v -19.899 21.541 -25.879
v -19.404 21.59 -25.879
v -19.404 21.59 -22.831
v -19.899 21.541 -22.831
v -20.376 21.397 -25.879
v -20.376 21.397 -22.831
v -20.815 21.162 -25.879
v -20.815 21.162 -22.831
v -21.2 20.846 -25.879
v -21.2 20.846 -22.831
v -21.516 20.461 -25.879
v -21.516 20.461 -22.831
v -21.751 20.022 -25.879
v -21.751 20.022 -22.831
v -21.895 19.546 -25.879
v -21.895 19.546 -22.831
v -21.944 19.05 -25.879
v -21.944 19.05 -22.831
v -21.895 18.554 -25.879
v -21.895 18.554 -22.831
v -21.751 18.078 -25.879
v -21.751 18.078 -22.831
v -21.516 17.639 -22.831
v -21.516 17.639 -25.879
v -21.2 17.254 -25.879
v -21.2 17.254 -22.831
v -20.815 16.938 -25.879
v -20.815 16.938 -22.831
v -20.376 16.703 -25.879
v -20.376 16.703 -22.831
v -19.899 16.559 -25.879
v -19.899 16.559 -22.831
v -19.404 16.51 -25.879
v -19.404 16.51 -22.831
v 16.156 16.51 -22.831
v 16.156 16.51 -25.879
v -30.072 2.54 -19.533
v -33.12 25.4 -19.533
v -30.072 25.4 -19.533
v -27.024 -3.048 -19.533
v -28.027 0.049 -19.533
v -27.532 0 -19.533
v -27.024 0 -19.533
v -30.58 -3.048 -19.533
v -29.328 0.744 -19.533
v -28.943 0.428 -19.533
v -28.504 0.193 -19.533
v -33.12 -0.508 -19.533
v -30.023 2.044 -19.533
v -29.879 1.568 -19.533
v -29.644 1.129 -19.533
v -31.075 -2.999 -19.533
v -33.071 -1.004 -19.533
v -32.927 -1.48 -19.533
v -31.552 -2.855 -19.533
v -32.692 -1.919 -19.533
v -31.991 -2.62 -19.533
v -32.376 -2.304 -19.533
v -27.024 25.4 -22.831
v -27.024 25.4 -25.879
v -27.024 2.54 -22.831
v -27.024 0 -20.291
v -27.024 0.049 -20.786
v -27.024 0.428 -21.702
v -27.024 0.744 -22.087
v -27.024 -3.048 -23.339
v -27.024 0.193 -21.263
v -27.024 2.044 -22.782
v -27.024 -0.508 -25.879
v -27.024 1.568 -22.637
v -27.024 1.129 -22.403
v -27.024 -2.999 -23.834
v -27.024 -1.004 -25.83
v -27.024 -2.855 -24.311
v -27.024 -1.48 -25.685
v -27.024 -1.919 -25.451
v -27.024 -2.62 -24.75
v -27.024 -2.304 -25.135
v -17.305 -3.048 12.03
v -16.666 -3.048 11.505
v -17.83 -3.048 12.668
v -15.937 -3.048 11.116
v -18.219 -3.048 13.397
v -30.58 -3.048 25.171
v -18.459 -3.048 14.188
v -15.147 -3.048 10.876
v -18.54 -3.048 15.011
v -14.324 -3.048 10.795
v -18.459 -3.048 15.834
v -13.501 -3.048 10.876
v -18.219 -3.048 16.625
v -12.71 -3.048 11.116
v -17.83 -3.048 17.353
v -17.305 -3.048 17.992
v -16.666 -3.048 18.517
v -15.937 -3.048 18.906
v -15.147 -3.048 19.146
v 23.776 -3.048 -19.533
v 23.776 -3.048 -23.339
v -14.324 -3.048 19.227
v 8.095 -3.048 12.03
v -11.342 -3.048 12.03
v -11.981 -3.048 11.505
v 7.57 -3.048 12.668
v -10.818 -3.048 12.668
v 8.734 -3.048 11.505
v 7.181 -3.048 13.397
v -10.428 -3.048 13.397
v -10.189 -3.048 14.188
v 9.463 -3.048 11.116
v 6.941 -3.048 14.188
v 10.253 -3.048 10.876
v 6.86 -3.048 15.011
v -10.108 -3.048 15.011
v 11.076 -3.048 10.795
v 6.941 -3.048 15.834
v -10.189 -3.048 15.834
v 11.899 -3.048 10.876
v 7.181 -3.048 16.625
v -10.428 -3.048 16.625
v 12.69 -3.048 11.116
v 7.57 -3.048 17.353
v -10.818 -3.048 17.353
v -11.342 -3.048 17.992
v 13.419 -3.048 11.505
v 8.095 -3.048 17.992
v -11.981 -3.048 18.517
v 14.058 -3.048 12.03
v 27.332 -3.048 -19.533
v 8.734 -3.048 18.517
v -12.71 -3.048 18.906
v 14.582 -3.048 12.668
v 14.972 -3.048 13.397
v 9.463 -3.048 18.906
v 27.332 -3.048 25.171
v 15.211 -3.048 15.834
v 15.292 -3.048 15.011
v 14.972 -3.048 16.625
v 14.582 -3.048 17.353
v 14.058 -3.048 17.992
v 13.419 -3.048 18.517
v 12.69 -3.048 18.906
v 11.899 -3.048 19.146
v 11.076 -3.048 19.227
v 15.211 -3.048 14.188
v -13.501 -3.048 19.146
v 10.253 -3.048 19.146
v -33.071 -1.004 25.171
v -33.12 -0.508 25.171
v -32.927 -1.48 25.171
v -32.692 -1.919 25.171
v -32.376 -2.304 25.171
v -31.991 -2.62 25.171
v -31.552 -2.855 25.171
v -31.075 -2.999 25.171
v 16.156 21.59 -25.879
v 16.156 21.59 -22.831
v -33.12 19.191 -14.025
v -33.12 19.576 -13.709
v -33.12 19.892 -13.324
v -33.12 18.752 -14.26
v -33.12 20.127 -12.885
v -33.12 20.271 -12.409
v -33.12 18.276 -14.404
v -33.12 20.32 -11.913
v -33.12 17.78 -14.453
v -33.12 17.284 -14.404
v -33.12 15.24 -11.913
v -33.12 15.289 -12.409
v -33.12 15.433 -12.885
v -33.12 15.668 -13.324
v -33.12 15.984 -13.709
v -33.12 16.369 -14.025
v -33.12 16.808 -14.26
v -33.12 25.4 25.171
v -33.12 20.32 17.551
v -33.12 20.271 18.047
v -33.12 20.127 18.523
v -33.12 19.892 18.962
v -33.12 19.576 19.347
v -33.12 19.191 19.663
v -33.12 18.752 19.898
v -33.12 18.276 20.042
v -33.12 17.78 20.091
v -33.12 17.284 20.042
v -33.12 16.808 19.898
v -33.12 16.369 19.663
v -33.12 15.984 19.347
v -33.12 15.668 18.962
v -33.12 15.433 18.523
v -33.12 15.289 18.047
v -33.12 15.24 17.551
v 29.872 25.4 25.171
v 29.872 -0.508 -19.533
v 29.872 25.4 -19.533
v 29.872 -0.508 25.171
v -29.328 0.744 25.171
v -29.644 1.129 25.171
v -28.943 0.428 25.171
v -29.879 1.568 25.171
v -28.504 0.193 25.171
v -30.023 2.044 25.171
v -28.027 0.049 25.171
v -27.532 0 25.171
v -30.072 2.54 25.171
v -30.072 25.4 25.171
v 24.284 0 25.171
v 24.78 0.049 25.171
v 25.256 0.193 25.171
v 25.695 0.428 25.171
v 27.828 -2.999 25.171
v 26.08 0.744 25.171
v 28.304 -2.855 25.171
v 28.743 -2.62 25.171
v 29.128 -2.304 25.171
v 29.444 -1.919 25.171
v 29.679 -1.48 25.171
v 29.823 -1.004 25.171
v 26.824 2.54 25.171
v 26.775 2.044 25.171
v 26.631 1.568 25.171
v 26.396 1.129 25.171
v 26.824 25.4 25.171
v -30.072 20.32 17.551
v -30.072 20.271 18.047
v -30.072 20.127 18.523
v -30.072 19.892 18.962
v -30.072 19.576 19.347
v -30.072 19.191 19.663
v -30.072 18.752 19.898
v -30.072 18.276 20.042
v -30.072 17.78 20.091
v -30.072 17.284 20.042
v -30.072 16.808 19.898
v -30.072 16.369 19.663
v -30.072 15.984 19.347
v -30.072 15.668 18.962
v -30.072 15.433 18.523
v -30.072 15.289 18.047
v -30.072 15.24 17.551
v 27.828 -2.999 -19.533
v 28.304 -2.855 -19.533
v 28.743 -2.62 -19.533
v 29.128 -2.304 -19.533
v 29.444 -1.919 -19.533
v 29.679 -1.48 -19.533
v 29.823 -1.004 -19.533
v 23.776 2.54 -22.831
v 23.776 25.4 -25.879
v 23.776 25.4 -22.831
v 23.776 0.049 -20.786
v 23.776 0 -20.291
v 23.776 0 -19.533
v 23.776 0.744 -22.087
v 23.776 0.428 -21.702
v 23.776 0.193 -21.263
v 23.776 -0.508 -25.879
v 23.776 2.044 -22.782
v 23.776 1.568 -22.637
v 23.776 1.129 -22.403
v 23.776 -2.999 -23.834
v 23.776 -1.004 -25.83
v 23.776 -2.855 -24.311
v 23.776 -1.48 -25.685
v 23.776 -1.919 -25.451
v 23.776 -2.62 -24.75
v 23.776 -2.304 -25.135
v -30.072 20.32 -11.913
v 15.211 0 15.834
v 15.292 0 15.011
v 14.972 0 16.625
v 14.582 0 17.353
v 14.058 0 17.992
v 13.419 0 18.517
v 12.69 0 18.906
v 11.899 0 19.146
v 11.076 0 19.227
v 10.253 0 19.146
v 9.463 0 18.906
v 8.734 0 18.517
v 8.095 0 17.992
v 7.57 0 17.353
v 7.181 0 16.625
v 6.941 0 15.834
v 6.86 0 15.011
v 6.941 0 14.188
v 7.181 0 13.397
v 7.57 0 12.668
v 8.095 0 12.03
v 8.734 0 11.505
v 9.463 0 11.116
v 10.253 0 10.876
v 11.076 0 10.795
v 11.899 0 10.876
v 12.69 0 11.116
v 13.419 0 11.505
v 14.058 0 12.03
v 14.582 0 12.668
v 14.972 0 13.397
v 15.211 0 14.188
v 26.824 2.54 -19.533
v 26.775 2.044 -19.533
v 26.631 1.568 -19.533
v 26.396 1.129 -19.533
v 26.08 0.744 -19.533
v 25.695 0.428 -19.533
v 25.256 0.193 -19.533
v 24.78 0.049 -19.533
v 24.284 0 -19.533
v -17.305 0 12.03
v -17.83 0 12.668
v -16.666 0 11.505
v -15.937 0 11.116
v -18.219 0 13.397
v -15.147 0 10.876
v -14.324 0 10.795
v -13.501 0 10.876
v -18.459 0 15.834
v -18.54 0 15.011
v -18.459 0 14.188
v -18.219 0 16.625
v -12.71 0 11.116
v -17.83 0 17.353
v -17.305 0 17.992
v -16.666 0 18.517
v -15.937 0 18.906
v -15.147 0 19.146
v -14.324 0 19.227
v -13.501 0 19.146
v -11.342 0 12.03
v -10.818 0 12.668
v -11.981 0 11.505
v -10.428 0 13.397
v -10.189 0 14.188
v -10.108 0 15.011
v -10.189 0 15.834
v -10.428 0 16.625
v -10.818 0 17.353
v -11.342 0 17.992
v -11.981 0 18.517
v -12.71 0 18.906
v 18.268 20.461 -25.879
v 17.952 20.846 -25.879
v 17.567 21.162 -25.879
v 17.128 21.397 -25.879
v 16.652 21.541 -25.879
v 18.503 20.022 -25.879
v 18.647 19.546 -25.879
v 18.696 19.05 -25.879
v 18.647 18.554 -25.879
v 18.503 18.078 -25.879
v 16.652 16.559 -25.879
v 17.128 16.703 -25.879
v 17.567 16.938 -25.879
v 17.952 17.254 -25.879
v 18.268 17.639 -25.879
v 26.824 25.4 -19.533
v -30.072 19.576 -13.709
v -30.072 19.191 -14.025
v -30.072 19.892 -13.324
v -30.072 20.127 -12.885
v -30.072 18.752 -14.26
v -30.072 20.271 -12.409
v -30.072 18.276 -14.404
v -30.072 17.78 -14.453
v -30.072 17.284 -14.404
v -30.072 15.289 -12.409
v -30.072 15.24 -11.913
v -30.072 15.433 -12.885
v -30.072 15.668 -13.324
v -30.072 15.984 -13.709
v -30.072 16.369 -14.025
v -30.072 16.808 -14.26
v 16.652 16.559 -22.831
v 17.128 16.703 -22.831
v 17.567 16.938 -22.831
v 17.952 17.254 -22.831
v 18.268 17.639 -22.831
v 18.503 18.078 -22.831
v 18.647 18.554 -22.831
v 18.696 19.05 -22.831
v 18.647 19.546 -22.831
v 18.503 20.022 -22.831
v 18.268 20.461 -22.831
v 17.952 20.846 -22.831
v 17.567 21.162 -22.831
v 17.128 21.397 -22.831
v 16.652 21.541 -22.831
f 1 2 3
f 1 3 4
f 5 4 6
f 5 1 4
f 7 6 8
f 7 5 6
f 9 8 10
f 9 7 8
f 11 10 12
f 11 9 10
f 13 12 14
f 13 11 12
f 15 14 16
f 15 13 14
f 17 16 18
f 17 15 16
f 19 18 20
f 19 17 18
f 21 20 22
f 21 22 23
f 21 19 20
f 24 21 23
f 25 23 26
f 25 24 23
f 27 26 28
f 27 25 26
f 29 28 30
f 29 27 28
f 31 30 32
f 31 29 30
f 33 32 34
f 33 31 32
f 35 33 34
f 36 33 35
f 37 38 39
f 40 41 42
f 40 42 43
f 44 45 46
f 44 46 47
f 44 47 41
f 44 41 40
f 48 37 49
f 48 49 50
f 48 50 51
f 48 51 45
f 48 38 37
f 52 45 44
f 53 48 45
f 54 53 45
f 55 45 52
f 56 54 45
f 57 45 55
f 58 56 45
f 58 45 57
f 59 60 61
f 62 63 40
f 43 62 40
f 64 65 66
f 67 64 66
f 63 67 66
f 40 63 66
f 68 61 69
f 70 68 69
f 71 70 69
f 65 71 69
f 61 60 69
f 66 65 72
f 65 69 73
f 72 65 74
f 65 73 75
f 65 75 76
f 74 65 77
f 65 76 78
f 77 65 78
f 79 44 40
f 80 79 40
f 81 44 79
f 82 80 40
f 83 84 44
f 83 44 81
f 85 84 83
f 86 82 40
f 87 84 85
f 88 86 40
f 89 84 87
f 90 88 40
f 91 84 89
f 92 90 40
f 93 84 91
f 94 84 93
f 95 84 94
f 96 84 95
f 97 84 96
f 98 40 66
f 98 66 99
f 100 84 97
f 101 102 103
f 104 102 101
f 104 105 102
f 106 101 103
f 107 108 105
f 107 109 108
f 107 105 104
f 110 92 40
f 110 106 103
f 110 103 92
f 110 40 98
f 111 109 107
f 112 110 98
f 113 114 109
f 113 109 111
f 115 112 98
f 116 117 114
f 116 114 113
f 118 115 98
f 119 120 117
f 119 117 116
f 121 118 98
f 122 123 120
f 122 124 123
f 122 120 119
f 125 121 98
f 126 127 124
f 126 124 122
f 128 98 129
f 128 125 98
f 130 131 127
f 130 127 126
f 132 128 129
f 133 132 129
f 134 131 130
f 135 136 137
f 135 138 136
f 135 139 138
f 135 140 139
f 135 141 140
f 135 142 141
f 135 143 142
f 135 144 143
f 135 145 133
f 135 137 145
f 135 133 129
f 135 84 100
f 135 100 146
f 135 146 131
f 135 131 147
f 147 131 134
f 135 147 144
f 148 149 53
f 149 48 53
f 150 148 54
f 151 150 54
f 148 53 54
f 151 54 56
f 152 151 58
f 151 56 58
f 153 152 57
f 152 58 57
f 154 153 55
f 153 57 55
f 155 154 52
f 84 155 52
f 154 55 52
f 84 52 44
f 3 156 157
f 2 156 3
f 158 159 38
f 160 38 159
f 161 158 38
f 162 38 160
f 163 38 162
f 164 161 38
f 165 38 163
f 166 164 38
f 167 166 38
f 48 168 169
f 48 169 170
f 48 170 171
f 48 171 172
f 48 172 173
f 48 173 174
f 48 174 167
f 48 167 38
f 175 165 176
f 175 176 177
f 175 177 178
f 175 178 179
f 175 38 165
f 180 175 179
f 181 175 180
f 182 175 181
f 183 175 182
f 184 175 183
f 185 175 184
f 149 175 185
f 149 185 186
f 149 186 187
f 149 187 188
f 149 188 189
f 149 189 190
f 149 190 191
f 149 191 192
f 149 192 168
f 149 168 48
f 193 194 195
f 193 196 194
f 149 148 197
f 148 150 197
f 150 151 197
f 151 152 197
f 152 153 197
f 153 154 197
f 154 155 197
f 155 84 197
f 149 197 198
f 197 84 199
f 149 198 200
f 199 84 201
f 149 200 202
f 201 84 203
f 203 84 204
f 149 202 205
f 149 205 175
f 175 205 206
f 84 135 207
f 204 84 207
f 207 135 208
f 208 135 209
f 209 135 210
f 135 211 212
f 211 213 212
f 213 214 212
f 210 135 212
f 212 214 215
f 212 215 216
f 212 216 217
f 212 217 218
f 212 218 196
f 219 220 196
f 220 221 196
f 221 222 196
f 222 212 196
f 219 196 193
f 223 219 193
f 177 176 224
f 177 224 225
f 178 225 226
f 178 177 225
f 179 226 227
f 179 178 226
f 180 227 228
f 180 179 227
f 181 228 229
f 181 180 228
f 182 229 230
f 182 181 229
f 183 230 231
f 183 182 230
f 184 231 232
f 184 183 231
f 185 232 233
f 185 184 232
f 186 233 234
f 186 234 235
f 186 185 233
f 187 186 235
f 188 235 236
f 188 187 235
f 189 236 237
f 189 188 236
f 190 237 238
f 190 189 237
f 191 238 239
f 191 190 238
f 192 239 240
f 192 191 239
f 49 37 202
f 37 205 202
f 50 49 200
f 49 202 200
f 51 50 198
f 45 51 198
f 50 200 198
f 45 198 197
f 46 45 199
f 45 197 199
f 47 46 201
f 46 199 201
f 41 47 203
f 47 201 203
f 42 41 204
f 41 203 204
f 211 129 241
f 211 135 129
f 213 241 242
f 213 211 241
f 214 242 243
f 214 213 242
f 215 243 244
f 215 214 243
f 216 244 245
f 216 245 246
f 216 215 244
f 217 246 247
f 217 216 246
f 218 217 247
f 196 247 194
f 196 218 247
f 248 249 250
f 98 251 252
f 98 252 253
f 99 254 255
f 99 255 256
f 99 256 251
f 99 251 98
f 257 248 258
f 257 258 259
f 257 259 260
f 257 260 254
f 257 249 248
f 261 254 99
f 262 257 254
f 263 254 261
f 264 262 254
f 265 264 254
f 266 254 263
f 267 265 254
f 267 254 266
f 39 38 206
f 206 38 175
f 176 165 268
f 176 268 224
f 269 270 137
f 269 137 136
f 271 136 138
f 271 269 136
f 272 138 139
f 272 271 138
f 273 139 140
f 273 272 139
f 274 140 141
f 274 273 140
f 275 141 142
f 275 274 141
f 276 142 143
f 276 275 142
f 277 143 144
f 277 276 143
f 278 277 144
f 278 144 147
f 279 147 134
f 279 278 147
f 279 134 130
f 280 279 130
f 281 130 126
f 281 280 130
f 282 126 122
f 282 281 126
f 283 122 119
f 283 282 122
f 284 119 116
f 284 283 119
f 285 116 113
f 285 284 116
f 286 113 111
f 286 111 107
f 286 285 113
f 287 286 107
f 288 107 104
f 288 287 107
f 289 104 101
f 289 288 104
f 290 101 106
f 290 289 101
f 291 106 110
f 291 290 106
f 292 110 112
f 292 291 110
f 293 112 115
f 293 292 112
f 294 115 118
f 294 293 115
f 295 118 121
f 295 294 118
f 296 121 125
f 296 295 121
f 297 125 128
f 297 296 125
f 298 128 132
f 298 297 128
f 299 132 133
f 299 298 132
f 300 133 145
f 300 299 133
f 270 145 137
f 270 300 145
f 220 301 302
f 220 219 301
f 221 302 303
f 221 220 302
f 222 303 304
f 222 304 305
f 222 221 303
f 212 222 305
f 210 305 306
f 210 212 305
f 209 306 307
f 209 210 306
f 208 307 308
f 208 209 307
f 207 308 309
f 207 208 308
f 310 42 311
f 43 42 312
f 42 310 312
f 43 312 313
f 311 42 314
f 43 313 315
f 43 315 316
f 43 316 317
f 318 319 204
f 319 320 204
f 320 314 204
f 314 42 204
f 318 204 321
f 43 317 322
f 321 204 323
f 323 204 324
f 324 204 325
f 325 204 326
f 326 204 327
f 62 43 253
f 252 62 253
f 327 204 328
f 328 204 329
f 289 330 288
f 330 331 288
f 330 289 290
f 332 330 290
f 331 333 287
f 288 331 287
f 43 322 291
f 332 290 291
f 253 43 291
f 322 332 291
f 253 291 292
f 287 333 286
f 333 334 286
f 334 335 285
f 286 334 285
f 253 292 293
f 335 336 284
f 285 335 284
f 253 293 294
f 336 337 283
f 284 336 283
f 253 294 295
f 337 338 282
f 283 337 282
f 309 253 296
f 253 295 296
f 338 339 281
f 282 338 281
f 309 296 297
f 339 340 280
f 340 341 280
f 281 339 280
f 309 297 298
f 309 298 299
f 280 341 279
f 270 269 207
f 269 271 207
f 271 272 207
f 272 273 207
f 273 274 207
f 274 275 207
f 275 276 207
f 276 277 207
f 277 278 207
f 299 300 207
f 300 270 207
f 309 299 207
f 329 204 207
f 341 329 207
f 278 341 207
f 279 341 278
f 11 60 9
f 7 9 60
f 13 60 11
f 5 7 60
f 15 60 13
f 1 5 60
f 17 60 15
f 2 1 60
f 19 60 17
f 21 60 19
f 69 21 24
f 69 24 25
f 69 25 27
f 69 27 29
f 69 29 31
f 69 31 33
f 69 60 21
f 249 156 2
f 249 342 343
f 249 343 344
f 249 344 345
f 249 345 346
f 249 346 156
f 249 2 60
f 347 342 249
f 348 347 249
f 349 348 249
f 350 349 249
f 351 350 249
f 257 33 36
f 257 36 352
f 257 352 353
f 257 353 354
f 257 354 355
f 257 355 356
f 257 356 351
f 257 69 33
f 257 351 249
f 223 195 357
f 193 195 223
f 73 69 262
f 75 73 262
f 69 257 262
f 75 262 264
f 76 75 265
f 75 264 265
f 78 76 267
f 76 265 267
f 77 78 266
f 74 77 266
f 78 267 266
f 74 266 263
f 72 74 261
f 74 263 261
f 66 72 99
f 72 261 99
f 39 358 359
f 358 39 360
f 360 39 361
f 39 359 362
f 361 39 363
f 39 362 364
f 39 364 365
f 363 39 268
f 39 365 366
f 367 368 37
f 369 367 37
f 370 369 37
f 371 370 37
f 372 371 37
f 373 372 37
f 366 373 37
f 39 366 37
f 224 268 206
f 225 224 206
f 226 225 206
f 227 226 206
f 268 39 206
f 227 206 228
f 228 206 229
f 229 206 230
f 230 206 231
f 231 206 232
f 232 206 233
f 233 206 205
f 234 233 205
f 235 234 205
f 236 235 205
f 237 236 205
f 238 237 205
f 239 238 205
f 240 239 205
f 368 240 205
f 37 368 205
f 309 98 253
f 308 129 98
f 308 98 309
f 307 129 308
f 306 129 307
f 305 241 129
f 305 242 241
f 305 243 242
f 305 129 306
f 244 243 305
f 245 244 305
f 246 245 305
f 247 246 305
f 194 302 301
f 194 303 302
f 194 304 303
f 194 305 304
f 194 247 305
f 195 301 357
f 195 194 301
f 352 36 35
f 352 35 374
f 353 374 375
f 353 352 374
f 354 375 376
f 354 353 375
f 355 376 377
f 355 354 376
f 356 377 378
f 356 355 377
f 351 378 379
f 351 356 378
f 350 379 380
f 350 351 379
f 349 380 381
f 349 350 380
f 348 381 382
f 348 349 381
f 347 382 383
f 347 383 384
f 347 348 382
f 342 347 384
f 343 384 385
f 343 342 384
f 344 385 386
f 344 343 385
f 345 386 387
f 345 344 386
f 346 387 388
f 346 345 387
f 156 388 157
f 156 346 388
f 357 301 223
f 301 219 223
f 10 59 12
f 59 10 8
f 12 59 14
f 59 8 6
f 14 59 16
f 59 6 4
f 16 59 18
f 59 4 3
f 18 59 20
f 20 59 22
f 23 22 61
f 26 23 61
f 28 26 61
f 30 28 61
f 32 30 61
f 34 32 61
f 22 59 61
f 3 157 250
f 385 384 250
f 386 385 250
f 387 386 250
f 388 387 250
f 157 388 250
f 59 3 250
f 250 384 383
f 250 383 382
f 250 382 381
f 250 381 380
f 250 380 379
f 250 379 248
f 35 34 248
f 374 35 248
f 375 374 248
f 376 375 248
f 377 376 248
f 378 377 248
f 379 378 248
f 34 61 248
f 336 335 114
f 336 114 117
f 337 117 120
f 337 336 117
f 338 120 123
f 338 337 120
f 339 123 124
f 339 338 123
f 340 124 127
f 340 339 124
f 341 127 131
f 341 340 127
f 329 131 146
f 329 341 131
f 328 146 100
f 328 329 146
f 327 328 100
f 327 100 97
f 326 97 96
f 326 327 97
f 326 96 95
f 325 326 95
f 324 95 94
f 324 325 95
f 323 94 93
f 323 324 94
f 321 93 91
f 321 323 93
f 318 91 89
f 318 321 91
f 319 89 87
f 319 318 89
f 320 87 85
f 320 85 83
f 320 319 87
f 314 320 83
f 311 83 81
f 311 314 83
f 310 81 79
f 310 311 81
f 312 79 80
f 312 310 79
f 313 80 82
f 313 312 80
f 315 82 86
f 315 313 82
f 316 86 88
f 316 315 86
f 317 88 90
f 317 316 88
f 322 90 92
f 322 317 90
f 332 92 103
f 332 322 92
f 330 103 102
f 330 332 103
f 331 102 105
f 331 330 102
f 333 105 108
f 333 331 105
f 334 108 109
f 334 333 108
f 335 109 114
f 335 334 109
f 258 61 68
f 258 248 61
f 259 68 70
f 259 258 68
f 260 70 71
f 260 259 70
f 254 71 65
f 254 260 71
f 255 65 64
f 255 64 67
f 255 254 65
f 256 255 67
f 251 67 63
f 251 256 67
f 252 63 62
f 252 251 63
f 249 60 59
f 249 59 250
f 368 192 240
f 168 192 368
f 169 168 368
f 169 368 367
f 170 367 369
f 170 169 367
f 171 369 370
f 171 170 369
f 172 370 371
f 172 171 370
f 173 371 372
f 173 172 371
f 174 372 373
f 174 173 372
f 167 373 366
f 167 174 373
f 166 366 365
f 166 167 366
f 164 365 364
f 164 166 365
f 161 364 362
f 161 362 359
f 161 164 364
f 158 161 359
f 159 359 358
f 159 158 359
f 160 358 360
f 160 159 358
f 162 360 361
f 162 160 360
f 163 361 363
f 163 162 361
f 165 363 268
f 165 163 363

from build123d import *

# Parameters (mm, degrees)
F0_R     = 4.2164
F1_DEPTH = 3.048
F3_W     = 25.4
F3_H     = 44.704
F5_DEPTH = 3.048
F4_W     = 50.8
F4_H     = 25.4
F6_DEPTH = 3.048
F2_W     = 25.4
F2_H     = 44.704
F7_DEPTH = 3.048
F8_R     = 2.54


with BuildPart() as f1:
    # F0 (on Front) → F1 (new body)
    with BuildSketch(Plane.XZ):
        Polygon((29.872065, 25.170984), (-33.119935, 25.170984), (-33.119935, -19.533016), (-27.023935, -19.533016), (-27.023935, -25.878732), (23.776065, -25.878732), (23.776065, -19.533016), (29.872065, -19.533016), align=None)
        with Locations((-14.323935, 15.010984)):
            Circle(F0_R, mode=Mode.SUBTRACT)
        with Locations((11.076065, 15.010984)):
            Circle(F0_R, mode=Mode.SUBTRACT)
    extrude(amount=F1_DEPTH)

    # F3 (on face) → F5 (join)
    with BuildSketch(Plane(origin=(-33.119935, 0, 0), x_dir=(0, -1, 0), z_dir=(-1, 0, 0))):
        with Locations((-12.7, 2.818984)):
            Rectangle(F3_W, F3_H)
        with BuildLine():
            Line((-20.32, -11.913016), (-20.32, 17.550984))
            ThreePointArc((-20.32, 17.550984), (-17.78, 20.090984), (-15.24, 17.550984))
            Line((-15.24, 17.550984), (-15.24, -11.913016))
            ThreePointArc((-15.24, -11.913016), (-17.78, -14.453016), (-20.32, -11.913016))
        make_face(mode=Mode.SUBTRACT)
    extrude(amount=-F5_DEPTH)

    # F4 (on face) → F6 (join)
    with BuildSketch(Plane(origin=(0, 0, -25.878732), x_dir=(1, 0, 0), z_dir=(0, 0, -1))):
        with Locations((-1.623935, -12.7)):
            Rectangle(F4_W, F4_H)
        with BuildLine():
            ThreePointArc((-19.403935, -21.59), (-21.943935, -19.05), (-19.403935, -16.51))
            Line((-19.403935, -16.51), (16.156065, -16.51))
            ThreePointArc((16.156065, -16.51), (18.696065, -19.05), (16.156065, -21.59))
            Line((16.156065, -21.59), (-19.403935, -21.59))
        make_face(mode=Mode.SUBTRACT)
    extrude(amount=-F6_DEPTH)

    # F2 (on face) → F7 (join)
    with BuildSketch(Plane.YZ.offset(29.872065)):
        with Locations((12.7, 2.818984)):
            Rectangle(F2_W, F2_H)
    extrude(amount=-F7_DEPTH)

    # F8
    f8_edges = [f1.edges().sort_by_distance(p)[0] for p in [
        (-33.119935, -3.048, 2.818984),
        (-30.071935, 0, 2.818984),
        (29.872065, -3.048, 2.818984),
        (26.824065, 0, 2.818984),
        (-1.623935, 0, -22.830732),
        (-1.623935, -3.048, -25.878732),
    ]]
    fillet(f8_edges, radius=F8_R)


solid = f1.part
